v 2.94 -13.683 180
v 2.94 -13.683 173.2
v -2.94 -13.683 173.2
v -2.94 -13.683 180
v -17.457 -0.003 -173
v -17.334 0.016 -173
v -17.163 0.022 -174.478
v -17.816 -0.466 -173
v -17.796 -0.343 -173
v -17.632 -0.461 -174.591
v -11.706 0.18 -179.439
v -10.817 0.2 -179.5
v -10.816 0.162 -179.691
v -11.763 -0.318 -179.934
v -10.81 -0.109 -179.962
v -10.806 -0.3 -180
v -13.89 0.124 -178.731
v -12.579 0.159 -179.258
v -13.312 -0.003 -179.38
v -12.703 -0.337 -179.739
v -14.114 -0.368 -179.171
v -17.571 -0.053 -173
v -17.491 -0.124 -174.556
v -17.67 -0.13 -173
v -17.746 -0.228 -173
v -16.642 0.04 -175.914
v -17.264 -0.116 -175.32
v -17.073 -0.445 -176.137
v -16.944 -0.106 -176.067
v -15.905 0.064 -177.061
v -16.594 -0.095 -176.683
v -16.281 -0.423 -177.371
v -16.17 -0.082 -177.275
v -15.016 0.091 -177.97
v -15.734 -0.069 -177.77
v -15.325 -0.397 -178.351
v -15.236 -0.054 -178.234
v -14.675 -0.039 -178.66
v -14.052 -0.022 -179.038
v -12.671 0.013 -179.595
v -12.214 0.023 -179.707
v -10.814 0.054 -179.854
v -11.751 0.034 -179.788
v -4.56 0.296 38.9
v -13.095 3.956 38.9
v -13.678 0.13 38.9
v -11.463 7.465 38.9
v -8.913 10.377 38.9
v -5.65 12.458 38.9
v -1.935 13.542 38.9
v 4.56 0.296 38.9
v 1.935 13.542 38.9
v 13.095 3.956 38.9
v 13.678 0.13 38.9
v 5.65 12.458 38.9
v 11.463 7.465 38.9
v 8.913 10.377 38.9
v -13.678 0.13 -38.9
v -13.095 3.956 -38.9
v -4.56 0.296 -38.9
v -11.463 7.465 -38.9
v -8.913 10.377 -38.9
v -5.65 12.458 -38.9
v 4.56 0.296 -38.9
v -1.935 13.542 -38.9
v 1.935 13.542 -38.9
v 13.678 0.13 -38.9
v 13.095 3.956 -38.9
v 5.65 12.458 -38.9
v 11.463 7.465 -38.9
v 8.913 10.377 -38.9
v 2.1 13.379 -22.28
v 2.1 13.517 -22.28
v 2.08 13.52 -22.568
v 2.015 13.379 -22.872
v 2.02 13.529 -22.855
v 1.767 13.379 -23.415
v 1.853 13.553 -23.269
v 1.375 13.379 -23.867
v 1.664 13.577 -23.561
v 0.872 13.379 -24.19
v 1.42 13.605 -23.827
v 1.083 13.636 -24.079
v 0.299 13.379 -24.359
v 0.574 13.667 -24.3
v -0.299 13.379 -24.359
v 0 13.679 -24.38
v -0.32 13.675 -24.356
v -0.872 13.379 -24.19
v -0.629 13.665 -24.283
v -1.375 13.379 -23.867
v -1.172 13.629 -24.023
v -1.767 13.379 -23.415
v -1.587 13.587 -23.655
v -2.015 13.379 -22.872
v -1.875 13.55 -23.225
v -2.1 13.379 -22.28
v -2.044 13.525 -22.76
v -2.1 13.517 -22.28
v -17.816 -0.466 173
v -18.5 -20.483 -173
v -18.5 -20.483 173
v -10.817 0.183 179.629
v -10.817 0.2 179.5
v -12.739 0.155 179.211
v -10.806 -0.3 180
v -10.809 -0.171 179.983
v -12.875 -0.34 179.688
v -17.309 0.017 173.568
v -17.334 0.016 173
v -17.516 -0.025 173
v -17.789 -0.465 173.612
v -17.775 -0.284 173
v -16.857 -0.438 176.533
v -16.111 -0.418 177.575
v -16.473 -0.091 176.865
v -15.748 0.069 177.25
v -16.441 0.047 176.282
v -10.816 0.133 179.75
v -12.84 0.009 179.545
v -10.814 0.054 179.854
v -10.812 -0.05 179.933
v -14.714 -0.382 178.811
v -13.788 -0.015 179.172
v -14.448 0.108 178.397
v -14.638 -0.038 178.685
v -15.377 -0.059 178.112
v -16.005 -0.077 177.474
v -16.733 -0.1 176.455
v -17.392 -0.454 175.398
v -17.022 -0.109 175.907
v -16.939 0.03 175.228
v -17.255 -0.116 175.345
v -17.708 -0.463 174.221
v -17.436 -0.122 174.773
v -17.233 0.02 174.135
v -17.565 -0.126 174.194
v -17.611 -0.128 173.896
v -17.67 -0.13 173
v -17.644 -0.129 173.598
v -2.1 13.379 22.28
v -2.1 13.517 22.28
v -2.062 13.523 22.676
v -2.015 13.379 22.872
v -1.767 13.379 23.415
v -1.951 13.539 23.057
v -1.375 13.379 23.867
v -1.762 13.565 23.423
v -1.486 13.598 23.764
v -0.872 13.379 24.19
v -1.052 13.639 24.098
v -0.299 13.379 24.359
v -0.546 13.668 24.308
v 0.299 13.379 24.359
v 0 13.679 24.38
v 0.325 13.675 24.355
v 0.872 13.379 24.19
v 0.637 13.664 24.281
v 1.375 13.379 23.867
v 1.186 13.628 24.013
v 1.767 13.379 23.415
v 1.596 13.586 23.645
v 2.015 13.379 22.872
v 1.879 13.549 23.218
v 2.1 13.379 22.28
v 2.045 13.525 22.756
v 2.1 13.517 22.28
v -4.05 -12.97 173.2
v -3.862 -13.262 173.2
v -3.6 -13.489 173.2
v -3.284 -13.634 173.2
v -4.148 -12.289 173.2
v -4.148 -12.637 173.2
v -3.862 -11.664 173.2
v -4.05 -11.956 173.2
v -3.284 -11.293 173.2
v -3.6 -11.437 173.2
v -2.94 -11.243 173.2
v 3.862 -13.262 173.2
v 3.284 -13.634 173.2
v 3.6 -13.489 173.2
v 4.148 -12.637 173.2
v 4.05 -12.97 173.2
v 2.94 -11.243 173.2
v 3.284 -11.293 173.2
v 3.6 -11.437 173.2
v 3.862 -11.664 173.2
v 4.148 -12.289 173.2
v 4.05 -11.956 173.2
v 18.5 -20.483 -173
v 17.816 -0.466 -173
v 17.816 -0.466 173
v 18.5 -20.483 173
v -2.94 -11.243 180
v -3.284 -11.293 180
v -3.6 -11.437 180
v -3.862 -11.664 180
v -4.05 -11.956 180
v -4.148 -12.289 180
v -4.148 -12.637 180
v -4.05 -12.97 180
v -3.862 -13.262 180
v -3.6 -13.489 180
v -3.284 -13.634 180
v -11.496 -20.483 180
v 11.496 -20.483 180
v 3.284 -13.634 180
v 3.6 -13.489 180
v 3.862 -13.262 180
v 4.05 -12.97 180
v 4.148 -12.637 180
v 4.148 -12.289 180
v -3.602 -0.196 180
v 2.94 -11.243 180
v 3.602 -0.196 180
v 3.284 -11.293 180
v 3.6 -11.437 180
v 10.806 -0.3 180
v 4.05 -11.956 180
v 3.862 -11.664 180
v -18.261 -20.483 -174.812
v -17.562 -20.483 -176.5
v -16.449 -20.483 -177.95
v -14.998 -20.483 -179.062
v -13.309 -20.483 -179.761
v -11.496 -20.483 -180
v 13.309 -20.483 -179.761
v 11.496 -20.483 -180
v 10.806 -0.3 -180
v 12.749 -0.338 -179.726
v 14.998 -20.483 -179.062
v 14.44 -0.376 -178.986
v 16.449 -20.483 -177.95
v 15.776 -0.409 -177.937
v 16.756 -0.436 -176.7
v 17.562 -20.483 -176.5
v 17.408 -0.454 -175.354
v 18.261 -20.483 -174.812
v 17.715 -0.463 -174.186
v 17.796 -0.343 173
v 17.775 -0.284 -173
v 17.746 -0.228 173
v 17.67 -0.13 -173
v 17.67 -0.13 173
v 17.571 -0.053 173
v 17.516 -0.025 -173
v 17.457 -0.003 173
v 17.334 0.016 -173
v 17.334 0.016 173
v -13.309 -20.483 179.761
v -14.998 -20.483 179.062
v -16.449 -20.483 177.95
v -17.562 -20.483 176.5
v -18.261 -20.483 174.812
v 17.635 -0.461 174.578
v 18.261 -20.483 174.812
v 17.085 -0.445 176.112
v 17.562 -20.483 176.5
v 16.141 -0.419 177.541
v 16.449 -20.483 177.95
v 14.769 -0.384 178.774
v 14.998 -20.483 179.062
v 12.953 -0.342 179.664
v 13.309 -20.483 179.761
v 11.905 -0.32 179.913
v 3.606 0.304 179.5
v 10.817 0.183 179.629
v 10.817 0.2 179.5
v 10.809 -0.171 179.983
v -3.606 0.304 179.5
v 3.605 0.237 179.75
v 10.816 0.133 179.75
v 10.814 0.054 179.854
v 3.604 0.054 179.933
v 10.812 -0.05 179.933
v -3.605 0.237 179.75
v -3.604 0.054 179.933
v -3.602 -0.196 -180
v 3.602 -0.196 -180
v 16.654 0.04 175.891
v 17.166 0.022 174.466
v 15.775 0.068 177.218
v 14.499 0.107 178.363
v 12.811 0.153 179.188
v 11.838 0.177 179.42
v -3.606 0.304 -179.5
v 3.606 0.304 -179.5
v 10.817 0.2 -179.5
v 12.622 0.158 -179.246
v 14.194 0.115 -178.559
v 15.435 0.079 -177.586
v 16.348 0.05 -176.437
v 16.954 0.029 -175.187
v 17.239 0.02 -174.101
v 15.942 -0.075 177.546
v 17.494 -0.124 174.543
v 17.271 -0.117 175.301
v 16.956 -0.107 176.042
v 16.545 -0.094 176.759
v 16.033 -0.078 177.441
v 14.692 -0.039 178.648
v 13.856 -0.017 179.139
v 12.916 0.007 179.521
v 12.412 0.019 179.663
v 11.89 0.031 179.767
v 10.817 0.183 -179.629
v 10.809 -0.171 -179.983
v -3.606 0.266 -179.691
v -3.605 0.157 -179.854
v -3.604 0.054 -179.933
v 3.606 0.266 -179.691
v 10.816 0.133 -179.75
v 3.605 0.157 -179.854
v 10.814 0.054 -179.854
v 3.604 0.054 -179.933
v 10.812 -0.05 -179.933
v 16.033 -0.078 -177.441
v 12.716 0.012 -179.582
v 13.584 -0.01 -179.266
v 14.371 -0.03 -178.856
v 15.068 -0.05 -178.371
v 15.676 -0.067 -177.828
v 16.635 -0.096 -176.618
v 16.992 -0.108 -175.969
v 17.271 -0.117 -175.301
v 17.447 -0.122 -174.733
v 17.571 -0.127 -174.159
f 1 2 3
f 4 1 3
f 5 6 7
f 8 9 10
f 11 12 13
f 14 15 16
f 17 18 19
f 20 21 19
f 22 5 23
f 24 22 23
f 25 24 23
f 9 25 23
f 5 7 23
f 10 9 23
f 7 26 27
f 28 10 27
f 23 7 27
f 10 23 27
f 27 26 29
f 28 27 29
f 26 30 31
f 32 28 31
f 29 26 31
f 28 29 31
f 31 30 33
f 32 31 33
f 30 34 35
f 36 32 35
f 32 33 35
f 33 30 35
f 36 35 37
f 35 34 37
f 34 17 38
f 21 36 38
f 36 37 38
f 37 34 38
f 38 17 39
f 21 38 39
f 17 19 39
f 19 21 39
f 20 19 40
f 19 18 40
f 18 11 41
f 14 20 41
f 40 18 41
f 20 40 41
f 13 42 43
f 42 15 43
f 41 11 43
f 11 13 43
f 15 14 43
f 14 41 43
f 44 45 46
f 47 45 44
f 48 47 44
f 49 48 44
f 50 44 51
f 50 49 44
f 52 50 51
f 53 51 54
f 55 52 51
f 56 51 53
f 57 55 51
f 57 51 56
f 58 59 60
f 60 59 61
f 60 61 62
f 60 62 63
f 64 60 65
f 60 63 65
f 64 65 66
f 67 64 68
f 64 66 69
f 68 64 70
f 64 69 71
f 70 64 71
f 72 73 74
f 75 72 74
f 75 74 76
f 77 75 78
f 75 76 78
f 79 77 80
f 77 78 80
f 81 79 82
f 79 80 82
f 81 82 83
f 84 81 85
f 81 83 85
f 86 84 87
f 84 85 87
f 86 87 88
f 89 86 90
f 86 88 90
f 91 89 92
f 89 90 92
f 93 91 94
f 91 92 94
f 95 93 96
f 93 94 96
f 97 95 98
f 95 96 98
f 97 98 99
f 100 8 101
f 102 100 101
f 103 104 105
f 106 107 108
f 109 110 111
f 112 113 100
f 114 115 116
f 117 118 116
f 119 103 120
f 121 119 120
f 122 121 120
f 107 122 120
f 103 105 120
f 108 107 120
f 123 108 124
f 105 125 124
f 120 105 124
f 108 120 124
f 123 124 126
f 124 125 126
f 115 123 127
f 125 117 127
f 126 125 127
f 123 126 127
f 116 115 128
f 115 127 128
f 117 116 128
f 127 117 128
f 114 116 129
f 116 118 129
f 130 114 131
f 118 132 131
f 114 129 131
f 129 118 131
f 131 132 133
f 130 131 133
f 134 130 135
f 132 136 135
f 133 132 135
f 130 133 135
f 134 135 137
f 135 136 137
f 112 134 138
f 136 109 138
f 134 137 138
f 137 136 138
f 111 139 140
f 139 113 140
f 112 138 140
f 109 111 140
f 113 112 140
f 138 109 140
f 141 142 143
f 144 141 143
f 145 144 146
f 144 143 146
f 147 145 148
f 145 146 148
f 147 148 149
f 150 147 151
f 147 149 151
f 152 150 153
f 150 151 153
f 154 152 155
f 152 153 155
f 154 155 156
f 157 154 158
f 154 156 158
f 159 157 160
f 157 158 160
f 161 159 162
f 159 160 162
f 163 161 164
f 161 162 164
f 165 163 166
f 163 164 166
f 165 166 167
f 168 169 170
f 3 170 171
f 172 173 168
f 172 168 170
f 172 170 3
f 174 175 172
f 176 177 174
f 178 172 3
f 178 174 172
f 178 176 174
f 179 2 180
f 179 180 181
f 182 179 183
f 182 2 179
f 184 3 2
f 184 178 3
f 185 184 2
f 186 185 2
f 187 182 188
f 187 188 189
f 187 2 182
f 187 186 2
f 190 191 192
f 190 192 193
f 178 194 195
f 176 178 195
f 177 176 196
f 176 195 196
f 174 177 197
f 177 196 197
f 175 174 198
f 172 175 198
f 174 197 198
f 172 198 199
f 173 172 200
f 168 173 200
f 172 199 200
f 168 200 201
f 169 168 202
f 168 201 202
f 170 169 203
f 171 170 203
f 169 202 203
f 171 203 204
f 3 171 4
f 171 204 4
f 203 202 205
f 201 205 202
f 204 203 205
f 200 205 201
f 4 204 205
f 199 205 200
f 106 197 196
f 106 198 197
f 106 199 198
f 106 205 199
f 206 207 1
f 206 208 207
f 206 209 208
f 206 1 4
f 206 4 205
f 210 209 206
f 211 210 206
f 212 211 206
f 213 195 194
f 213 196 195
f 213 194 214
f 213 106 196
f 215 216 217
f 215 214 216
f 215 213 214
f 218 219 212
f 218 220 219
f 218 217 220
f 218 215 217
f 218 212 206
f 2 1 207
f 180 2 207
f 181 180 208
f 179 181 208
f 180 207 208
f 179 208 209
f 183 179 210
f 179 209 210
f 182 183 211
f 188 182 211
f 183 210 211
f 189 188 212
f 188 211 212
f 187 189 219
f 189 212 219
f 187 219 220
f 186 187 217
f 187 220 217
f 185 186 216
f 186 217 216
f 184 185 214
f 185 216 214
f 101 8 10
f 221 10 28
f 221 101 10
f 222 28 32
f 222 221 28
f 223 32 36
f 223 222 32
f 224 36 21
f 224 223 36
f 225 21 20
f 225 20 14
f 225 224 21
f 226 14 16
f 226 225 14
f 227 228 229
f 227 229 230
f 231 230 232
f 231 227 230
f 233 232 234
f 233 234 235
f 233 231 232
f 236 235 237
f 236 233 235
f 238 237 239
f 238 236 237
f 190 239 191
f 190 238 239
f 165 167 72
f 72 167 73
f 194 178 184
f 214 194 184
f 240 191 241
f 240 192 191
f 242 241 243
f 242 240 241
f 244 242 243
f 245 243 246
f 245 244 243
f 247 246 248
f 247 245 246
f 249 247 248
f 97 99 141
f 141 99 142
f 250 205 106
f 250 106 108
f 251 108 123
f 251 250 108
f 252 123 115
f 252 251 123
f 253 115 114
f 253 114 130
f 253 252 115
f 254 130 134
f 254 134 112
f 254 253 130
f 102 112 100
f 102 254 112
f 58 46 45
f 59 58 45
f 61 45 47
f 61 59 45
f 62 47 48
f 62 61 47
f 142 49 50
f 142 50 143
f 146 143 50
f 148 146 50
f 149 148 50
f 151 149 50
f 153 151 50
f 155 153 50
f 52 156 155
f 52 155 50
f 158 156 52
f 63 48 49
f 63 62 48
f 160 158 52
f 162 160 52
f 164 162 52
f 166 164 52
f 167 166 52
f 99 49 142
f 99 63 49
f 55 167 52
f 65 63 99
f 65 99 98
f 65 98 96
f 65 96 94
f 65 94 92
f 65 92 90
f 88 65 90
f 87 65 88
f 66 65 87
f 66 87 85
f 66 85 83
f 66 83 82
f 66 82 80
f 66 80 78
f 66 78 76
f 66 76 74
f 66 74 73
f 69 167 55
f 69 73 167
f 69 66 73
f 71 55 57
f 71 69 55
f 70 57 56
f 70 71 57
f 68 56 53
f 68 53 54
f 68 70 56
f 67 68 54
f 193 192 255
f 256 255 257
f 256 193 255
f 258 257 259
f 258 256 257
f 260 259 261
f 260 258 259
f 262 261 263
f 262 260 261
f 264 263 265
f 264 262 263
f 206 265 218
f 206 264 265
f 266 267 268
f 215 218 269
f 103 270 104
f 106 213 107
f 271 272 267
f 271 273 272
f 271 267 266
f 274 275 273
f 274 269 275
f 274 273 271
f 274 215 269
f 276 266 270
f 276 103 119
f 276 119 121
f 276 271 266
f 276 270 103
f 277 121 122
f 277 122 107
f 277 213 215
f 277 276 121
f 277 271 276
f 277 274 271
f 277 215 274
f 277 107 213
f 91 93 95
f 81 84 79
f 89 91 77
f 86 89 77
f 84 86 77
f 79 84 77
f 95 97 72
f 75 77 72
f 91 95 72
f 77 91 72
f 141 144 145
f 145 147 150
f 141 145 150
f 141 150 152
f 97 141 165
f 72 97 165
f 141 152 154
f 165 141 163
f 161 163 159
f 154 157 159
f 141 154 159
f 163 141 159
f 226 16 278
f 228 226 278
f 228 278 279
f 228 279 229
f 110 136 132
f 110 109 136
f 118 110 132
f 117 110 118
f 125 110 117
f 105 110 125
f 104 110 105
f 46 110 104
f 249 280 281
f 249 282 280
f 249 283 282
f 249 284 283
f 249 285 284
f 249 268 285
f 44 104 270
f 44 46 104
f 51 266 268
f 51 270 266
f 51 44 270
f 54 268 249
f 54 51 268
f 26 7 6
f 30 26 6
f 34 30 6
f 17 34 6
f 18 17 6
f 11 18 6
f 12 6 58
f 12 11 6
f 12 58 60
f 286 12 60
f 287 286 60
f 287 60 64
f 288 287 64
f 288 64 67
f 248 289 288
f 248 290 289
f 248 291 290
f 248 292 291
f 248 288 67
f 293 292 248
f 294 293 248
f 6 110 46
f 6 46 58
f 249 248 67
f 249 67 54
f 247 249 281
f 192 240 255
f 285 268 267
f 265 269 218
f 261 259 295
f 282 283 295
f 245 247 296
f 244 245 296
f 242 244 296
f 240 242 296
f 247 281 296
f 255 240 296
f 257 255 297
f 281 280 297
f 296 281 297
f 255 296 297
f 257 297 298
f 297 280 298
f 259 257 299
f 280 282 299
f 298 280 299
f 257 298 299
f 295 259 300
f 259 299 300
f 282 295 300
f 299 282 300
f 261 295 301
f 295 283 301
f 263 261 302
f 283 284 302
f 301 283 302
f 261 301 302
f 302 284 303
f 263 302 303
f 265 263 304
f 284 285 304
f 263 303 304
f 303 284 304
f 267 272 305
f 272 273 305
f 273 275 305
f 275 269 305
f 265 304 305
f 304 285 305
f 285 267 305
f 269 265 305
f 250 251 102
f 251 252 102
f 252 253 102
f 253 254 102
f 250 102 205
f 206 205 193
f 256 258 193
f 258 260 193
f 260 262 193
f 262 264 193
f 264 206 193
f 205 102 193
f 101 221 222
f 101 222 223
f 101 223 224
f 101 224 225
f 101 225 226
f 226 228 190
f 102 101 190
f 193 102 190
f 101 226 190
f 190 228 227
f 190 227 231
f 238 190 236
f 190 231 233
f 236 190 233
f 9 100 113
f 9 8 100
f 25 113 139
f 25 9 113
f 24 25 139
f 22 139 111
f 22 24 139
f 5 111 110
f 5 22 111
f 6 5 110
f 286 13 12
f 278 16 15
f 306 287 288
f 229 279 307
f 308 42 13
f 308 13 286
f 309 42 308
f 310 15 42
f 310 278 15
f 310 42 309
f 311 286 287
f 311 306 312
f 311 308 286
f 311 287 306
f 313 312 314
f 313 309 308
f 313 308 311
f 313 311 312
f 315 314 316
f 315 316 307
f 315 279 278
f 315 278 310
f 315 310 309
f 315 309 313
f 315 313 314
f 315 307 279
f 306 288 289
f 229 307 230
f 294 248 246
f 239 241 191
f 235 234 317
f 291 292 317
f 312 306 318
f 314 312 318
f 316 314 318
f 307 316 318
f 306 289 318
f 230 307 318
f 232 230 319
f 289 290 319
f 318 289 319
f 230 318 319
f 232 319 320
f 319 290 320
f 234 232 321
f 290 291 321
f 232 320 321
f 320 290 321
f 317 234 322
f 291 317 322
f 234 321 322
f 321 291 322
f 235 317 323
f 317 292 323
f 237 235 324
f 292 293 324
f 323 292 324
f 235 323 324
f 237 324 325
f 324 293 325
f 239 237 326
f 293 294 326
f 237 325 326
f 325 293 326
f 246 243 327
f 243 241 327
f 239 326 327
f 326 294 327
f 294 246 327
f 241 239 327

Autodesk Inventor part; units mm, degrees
ref_plane "YZ Plane" through (0, 0, 0) normal (1, 0, 0) x (0, 1, 0)
ref_plane "XZ Plane" through (0, 0, 0) normal (0, 1, 0) x (-1, 0, 0)
sketch "草圖1" plane through (0, 0, 0) normal (0, 0, 1) x (1, 0, 0)
  line L0 (-17.8, 0) -> (17.8, 0)
  line L1 (-17.8, 0) -> (17.8, 0) construction
  line L2 (-18.5, -20.4831) -> (18.5, -20.4831)
  line L3 (-17.8, 0) -> (-18.5, -20.4831)
  line L4 (17.8, 0) -> (18.5, -20.4831)
  arc A0 (17.8, 0) -> (-17.8, 0) centre (0, -499.6831) ccw
  circle A1 centre (0, 0) radius 13.6791
  line L5 (0, 13.6791) -> (0, -20.4831) construction
  line L6 (-2.1, 13.5169) -> (2.1, 13.5169)
  point P0 (0, 0)
  point P1 (0, 0)
  point P2 (-13.6785, 0.1298)
  point P3 (13.6785, 0.1298)
  point P4 (0, 0.3169)
  point P5 (0, 13.5169)
  dimension "d0" = 35.6
  dimension "d2" = 37
  dimension "d15" = 500
  dimension "d32" = 20.8
  dimension "d34" = 34
  dimension "d35" = 4.2
extrude "擠出1" add sketch "草圖1" along normal mid plane 360 contours A1 A0 L0 | A1 L0 | L0 A1 A0 | L0 L4 L2 L3 A1 | L0 A0 A1
extrude "擠出4" add sketch "草圖1" along normal mid plane 77.8 contours A0 A1 L6 | L6 A1
fillet "圓角3" radius 7 4 edges at (-18.15, -10.2415, -180) (18.15, -10.2415, -180) (18.15, -10.2415, 180) (-18.15, -10.2415, 180)
fillet "圓角4" radius 0.5 8 edges at (16.1323, 0.0566, 177.5316) (0, 0.3169, 180) (-16.1323, 0.0566, 177.5316) (-17.8, 0, 0) (-16.1323, 0.0566, -177.5316) (0, 0.3169, -180) (16.1338, 0.0566, -177.5299) (17.8, 0, 0)
sketch "草圖4" plane through (0, 0, 180) normal (0, 0, 1) x (1, 0, 0)
  line L0 (-2.94, -11.2431) -> (2.94, -11.2431)
  line L1 (2.94, -11.2431) -> (2.94, -13.6831)
  line L2 (2.94, -13.6831) -> (-2.94, -13.6831)
  line L3 (-2.94, -13.6831) -> (-2.94, -11.2431)
  circle A0 centre (2.94, -12.4631) radius 1.22
  circle A1 centre (-2.94, -12.4631) radius 1.22
  line L4 (-4.16, -12.4631) -> (4.16, -12.4631) construction
  arc A2 (10.8062, -0.3) -> (-10.8062, -0.3) centre (0, -499.6831) ccw projected
  line L5 (-11.4959, -20.4831) -> (11.4959, -20.4831) projected
  point P0 (0, 0)
  point P1 (0, -12.4631)
  point P2 (0, -0.1831)
  dimension "d28" = 2.44
  dimension "d30" = 8.32
  dimension "d31" = 6.8
ref_plane "工作平面4" through (0, 13.6791, 0) normal (0, -1, 0) x (1, 0, 0)
sketch "草圖5" plane through (0, 13.6791, 0) normal (0, -1, 0) x (1, 0, 0)
  line L0 (0, 22.28) -> (0, -22.28) construction
  line L1 (2.1, 22.28) -> (2.1, -22.28)
  line L2 (-2.1, -22.28) -> (-2.1, 22.28)
  arc A0 (2.1, 22.28) -> (-2.1, 22.28) centre (0, 22.28) ccw
  arc A1 (-2.1, -22.28) -> (2.1, -22.28) centre (0, -22.28) ccw
  line L3 (0, 24.38) -> (0, -24.38) construction
  point P0 (0, 0)
  point P1 (0, 0)
  point P2 (0, 0)
  dimension "d36" = 4.2
  dimension "d37" = 48.76
extrude "擠出6" cut sketch "草圖5" along normal blind 0.3
extrude "擠出7" cut sketch "草圖4" against normal blind 6.8
properties part number "燈"
